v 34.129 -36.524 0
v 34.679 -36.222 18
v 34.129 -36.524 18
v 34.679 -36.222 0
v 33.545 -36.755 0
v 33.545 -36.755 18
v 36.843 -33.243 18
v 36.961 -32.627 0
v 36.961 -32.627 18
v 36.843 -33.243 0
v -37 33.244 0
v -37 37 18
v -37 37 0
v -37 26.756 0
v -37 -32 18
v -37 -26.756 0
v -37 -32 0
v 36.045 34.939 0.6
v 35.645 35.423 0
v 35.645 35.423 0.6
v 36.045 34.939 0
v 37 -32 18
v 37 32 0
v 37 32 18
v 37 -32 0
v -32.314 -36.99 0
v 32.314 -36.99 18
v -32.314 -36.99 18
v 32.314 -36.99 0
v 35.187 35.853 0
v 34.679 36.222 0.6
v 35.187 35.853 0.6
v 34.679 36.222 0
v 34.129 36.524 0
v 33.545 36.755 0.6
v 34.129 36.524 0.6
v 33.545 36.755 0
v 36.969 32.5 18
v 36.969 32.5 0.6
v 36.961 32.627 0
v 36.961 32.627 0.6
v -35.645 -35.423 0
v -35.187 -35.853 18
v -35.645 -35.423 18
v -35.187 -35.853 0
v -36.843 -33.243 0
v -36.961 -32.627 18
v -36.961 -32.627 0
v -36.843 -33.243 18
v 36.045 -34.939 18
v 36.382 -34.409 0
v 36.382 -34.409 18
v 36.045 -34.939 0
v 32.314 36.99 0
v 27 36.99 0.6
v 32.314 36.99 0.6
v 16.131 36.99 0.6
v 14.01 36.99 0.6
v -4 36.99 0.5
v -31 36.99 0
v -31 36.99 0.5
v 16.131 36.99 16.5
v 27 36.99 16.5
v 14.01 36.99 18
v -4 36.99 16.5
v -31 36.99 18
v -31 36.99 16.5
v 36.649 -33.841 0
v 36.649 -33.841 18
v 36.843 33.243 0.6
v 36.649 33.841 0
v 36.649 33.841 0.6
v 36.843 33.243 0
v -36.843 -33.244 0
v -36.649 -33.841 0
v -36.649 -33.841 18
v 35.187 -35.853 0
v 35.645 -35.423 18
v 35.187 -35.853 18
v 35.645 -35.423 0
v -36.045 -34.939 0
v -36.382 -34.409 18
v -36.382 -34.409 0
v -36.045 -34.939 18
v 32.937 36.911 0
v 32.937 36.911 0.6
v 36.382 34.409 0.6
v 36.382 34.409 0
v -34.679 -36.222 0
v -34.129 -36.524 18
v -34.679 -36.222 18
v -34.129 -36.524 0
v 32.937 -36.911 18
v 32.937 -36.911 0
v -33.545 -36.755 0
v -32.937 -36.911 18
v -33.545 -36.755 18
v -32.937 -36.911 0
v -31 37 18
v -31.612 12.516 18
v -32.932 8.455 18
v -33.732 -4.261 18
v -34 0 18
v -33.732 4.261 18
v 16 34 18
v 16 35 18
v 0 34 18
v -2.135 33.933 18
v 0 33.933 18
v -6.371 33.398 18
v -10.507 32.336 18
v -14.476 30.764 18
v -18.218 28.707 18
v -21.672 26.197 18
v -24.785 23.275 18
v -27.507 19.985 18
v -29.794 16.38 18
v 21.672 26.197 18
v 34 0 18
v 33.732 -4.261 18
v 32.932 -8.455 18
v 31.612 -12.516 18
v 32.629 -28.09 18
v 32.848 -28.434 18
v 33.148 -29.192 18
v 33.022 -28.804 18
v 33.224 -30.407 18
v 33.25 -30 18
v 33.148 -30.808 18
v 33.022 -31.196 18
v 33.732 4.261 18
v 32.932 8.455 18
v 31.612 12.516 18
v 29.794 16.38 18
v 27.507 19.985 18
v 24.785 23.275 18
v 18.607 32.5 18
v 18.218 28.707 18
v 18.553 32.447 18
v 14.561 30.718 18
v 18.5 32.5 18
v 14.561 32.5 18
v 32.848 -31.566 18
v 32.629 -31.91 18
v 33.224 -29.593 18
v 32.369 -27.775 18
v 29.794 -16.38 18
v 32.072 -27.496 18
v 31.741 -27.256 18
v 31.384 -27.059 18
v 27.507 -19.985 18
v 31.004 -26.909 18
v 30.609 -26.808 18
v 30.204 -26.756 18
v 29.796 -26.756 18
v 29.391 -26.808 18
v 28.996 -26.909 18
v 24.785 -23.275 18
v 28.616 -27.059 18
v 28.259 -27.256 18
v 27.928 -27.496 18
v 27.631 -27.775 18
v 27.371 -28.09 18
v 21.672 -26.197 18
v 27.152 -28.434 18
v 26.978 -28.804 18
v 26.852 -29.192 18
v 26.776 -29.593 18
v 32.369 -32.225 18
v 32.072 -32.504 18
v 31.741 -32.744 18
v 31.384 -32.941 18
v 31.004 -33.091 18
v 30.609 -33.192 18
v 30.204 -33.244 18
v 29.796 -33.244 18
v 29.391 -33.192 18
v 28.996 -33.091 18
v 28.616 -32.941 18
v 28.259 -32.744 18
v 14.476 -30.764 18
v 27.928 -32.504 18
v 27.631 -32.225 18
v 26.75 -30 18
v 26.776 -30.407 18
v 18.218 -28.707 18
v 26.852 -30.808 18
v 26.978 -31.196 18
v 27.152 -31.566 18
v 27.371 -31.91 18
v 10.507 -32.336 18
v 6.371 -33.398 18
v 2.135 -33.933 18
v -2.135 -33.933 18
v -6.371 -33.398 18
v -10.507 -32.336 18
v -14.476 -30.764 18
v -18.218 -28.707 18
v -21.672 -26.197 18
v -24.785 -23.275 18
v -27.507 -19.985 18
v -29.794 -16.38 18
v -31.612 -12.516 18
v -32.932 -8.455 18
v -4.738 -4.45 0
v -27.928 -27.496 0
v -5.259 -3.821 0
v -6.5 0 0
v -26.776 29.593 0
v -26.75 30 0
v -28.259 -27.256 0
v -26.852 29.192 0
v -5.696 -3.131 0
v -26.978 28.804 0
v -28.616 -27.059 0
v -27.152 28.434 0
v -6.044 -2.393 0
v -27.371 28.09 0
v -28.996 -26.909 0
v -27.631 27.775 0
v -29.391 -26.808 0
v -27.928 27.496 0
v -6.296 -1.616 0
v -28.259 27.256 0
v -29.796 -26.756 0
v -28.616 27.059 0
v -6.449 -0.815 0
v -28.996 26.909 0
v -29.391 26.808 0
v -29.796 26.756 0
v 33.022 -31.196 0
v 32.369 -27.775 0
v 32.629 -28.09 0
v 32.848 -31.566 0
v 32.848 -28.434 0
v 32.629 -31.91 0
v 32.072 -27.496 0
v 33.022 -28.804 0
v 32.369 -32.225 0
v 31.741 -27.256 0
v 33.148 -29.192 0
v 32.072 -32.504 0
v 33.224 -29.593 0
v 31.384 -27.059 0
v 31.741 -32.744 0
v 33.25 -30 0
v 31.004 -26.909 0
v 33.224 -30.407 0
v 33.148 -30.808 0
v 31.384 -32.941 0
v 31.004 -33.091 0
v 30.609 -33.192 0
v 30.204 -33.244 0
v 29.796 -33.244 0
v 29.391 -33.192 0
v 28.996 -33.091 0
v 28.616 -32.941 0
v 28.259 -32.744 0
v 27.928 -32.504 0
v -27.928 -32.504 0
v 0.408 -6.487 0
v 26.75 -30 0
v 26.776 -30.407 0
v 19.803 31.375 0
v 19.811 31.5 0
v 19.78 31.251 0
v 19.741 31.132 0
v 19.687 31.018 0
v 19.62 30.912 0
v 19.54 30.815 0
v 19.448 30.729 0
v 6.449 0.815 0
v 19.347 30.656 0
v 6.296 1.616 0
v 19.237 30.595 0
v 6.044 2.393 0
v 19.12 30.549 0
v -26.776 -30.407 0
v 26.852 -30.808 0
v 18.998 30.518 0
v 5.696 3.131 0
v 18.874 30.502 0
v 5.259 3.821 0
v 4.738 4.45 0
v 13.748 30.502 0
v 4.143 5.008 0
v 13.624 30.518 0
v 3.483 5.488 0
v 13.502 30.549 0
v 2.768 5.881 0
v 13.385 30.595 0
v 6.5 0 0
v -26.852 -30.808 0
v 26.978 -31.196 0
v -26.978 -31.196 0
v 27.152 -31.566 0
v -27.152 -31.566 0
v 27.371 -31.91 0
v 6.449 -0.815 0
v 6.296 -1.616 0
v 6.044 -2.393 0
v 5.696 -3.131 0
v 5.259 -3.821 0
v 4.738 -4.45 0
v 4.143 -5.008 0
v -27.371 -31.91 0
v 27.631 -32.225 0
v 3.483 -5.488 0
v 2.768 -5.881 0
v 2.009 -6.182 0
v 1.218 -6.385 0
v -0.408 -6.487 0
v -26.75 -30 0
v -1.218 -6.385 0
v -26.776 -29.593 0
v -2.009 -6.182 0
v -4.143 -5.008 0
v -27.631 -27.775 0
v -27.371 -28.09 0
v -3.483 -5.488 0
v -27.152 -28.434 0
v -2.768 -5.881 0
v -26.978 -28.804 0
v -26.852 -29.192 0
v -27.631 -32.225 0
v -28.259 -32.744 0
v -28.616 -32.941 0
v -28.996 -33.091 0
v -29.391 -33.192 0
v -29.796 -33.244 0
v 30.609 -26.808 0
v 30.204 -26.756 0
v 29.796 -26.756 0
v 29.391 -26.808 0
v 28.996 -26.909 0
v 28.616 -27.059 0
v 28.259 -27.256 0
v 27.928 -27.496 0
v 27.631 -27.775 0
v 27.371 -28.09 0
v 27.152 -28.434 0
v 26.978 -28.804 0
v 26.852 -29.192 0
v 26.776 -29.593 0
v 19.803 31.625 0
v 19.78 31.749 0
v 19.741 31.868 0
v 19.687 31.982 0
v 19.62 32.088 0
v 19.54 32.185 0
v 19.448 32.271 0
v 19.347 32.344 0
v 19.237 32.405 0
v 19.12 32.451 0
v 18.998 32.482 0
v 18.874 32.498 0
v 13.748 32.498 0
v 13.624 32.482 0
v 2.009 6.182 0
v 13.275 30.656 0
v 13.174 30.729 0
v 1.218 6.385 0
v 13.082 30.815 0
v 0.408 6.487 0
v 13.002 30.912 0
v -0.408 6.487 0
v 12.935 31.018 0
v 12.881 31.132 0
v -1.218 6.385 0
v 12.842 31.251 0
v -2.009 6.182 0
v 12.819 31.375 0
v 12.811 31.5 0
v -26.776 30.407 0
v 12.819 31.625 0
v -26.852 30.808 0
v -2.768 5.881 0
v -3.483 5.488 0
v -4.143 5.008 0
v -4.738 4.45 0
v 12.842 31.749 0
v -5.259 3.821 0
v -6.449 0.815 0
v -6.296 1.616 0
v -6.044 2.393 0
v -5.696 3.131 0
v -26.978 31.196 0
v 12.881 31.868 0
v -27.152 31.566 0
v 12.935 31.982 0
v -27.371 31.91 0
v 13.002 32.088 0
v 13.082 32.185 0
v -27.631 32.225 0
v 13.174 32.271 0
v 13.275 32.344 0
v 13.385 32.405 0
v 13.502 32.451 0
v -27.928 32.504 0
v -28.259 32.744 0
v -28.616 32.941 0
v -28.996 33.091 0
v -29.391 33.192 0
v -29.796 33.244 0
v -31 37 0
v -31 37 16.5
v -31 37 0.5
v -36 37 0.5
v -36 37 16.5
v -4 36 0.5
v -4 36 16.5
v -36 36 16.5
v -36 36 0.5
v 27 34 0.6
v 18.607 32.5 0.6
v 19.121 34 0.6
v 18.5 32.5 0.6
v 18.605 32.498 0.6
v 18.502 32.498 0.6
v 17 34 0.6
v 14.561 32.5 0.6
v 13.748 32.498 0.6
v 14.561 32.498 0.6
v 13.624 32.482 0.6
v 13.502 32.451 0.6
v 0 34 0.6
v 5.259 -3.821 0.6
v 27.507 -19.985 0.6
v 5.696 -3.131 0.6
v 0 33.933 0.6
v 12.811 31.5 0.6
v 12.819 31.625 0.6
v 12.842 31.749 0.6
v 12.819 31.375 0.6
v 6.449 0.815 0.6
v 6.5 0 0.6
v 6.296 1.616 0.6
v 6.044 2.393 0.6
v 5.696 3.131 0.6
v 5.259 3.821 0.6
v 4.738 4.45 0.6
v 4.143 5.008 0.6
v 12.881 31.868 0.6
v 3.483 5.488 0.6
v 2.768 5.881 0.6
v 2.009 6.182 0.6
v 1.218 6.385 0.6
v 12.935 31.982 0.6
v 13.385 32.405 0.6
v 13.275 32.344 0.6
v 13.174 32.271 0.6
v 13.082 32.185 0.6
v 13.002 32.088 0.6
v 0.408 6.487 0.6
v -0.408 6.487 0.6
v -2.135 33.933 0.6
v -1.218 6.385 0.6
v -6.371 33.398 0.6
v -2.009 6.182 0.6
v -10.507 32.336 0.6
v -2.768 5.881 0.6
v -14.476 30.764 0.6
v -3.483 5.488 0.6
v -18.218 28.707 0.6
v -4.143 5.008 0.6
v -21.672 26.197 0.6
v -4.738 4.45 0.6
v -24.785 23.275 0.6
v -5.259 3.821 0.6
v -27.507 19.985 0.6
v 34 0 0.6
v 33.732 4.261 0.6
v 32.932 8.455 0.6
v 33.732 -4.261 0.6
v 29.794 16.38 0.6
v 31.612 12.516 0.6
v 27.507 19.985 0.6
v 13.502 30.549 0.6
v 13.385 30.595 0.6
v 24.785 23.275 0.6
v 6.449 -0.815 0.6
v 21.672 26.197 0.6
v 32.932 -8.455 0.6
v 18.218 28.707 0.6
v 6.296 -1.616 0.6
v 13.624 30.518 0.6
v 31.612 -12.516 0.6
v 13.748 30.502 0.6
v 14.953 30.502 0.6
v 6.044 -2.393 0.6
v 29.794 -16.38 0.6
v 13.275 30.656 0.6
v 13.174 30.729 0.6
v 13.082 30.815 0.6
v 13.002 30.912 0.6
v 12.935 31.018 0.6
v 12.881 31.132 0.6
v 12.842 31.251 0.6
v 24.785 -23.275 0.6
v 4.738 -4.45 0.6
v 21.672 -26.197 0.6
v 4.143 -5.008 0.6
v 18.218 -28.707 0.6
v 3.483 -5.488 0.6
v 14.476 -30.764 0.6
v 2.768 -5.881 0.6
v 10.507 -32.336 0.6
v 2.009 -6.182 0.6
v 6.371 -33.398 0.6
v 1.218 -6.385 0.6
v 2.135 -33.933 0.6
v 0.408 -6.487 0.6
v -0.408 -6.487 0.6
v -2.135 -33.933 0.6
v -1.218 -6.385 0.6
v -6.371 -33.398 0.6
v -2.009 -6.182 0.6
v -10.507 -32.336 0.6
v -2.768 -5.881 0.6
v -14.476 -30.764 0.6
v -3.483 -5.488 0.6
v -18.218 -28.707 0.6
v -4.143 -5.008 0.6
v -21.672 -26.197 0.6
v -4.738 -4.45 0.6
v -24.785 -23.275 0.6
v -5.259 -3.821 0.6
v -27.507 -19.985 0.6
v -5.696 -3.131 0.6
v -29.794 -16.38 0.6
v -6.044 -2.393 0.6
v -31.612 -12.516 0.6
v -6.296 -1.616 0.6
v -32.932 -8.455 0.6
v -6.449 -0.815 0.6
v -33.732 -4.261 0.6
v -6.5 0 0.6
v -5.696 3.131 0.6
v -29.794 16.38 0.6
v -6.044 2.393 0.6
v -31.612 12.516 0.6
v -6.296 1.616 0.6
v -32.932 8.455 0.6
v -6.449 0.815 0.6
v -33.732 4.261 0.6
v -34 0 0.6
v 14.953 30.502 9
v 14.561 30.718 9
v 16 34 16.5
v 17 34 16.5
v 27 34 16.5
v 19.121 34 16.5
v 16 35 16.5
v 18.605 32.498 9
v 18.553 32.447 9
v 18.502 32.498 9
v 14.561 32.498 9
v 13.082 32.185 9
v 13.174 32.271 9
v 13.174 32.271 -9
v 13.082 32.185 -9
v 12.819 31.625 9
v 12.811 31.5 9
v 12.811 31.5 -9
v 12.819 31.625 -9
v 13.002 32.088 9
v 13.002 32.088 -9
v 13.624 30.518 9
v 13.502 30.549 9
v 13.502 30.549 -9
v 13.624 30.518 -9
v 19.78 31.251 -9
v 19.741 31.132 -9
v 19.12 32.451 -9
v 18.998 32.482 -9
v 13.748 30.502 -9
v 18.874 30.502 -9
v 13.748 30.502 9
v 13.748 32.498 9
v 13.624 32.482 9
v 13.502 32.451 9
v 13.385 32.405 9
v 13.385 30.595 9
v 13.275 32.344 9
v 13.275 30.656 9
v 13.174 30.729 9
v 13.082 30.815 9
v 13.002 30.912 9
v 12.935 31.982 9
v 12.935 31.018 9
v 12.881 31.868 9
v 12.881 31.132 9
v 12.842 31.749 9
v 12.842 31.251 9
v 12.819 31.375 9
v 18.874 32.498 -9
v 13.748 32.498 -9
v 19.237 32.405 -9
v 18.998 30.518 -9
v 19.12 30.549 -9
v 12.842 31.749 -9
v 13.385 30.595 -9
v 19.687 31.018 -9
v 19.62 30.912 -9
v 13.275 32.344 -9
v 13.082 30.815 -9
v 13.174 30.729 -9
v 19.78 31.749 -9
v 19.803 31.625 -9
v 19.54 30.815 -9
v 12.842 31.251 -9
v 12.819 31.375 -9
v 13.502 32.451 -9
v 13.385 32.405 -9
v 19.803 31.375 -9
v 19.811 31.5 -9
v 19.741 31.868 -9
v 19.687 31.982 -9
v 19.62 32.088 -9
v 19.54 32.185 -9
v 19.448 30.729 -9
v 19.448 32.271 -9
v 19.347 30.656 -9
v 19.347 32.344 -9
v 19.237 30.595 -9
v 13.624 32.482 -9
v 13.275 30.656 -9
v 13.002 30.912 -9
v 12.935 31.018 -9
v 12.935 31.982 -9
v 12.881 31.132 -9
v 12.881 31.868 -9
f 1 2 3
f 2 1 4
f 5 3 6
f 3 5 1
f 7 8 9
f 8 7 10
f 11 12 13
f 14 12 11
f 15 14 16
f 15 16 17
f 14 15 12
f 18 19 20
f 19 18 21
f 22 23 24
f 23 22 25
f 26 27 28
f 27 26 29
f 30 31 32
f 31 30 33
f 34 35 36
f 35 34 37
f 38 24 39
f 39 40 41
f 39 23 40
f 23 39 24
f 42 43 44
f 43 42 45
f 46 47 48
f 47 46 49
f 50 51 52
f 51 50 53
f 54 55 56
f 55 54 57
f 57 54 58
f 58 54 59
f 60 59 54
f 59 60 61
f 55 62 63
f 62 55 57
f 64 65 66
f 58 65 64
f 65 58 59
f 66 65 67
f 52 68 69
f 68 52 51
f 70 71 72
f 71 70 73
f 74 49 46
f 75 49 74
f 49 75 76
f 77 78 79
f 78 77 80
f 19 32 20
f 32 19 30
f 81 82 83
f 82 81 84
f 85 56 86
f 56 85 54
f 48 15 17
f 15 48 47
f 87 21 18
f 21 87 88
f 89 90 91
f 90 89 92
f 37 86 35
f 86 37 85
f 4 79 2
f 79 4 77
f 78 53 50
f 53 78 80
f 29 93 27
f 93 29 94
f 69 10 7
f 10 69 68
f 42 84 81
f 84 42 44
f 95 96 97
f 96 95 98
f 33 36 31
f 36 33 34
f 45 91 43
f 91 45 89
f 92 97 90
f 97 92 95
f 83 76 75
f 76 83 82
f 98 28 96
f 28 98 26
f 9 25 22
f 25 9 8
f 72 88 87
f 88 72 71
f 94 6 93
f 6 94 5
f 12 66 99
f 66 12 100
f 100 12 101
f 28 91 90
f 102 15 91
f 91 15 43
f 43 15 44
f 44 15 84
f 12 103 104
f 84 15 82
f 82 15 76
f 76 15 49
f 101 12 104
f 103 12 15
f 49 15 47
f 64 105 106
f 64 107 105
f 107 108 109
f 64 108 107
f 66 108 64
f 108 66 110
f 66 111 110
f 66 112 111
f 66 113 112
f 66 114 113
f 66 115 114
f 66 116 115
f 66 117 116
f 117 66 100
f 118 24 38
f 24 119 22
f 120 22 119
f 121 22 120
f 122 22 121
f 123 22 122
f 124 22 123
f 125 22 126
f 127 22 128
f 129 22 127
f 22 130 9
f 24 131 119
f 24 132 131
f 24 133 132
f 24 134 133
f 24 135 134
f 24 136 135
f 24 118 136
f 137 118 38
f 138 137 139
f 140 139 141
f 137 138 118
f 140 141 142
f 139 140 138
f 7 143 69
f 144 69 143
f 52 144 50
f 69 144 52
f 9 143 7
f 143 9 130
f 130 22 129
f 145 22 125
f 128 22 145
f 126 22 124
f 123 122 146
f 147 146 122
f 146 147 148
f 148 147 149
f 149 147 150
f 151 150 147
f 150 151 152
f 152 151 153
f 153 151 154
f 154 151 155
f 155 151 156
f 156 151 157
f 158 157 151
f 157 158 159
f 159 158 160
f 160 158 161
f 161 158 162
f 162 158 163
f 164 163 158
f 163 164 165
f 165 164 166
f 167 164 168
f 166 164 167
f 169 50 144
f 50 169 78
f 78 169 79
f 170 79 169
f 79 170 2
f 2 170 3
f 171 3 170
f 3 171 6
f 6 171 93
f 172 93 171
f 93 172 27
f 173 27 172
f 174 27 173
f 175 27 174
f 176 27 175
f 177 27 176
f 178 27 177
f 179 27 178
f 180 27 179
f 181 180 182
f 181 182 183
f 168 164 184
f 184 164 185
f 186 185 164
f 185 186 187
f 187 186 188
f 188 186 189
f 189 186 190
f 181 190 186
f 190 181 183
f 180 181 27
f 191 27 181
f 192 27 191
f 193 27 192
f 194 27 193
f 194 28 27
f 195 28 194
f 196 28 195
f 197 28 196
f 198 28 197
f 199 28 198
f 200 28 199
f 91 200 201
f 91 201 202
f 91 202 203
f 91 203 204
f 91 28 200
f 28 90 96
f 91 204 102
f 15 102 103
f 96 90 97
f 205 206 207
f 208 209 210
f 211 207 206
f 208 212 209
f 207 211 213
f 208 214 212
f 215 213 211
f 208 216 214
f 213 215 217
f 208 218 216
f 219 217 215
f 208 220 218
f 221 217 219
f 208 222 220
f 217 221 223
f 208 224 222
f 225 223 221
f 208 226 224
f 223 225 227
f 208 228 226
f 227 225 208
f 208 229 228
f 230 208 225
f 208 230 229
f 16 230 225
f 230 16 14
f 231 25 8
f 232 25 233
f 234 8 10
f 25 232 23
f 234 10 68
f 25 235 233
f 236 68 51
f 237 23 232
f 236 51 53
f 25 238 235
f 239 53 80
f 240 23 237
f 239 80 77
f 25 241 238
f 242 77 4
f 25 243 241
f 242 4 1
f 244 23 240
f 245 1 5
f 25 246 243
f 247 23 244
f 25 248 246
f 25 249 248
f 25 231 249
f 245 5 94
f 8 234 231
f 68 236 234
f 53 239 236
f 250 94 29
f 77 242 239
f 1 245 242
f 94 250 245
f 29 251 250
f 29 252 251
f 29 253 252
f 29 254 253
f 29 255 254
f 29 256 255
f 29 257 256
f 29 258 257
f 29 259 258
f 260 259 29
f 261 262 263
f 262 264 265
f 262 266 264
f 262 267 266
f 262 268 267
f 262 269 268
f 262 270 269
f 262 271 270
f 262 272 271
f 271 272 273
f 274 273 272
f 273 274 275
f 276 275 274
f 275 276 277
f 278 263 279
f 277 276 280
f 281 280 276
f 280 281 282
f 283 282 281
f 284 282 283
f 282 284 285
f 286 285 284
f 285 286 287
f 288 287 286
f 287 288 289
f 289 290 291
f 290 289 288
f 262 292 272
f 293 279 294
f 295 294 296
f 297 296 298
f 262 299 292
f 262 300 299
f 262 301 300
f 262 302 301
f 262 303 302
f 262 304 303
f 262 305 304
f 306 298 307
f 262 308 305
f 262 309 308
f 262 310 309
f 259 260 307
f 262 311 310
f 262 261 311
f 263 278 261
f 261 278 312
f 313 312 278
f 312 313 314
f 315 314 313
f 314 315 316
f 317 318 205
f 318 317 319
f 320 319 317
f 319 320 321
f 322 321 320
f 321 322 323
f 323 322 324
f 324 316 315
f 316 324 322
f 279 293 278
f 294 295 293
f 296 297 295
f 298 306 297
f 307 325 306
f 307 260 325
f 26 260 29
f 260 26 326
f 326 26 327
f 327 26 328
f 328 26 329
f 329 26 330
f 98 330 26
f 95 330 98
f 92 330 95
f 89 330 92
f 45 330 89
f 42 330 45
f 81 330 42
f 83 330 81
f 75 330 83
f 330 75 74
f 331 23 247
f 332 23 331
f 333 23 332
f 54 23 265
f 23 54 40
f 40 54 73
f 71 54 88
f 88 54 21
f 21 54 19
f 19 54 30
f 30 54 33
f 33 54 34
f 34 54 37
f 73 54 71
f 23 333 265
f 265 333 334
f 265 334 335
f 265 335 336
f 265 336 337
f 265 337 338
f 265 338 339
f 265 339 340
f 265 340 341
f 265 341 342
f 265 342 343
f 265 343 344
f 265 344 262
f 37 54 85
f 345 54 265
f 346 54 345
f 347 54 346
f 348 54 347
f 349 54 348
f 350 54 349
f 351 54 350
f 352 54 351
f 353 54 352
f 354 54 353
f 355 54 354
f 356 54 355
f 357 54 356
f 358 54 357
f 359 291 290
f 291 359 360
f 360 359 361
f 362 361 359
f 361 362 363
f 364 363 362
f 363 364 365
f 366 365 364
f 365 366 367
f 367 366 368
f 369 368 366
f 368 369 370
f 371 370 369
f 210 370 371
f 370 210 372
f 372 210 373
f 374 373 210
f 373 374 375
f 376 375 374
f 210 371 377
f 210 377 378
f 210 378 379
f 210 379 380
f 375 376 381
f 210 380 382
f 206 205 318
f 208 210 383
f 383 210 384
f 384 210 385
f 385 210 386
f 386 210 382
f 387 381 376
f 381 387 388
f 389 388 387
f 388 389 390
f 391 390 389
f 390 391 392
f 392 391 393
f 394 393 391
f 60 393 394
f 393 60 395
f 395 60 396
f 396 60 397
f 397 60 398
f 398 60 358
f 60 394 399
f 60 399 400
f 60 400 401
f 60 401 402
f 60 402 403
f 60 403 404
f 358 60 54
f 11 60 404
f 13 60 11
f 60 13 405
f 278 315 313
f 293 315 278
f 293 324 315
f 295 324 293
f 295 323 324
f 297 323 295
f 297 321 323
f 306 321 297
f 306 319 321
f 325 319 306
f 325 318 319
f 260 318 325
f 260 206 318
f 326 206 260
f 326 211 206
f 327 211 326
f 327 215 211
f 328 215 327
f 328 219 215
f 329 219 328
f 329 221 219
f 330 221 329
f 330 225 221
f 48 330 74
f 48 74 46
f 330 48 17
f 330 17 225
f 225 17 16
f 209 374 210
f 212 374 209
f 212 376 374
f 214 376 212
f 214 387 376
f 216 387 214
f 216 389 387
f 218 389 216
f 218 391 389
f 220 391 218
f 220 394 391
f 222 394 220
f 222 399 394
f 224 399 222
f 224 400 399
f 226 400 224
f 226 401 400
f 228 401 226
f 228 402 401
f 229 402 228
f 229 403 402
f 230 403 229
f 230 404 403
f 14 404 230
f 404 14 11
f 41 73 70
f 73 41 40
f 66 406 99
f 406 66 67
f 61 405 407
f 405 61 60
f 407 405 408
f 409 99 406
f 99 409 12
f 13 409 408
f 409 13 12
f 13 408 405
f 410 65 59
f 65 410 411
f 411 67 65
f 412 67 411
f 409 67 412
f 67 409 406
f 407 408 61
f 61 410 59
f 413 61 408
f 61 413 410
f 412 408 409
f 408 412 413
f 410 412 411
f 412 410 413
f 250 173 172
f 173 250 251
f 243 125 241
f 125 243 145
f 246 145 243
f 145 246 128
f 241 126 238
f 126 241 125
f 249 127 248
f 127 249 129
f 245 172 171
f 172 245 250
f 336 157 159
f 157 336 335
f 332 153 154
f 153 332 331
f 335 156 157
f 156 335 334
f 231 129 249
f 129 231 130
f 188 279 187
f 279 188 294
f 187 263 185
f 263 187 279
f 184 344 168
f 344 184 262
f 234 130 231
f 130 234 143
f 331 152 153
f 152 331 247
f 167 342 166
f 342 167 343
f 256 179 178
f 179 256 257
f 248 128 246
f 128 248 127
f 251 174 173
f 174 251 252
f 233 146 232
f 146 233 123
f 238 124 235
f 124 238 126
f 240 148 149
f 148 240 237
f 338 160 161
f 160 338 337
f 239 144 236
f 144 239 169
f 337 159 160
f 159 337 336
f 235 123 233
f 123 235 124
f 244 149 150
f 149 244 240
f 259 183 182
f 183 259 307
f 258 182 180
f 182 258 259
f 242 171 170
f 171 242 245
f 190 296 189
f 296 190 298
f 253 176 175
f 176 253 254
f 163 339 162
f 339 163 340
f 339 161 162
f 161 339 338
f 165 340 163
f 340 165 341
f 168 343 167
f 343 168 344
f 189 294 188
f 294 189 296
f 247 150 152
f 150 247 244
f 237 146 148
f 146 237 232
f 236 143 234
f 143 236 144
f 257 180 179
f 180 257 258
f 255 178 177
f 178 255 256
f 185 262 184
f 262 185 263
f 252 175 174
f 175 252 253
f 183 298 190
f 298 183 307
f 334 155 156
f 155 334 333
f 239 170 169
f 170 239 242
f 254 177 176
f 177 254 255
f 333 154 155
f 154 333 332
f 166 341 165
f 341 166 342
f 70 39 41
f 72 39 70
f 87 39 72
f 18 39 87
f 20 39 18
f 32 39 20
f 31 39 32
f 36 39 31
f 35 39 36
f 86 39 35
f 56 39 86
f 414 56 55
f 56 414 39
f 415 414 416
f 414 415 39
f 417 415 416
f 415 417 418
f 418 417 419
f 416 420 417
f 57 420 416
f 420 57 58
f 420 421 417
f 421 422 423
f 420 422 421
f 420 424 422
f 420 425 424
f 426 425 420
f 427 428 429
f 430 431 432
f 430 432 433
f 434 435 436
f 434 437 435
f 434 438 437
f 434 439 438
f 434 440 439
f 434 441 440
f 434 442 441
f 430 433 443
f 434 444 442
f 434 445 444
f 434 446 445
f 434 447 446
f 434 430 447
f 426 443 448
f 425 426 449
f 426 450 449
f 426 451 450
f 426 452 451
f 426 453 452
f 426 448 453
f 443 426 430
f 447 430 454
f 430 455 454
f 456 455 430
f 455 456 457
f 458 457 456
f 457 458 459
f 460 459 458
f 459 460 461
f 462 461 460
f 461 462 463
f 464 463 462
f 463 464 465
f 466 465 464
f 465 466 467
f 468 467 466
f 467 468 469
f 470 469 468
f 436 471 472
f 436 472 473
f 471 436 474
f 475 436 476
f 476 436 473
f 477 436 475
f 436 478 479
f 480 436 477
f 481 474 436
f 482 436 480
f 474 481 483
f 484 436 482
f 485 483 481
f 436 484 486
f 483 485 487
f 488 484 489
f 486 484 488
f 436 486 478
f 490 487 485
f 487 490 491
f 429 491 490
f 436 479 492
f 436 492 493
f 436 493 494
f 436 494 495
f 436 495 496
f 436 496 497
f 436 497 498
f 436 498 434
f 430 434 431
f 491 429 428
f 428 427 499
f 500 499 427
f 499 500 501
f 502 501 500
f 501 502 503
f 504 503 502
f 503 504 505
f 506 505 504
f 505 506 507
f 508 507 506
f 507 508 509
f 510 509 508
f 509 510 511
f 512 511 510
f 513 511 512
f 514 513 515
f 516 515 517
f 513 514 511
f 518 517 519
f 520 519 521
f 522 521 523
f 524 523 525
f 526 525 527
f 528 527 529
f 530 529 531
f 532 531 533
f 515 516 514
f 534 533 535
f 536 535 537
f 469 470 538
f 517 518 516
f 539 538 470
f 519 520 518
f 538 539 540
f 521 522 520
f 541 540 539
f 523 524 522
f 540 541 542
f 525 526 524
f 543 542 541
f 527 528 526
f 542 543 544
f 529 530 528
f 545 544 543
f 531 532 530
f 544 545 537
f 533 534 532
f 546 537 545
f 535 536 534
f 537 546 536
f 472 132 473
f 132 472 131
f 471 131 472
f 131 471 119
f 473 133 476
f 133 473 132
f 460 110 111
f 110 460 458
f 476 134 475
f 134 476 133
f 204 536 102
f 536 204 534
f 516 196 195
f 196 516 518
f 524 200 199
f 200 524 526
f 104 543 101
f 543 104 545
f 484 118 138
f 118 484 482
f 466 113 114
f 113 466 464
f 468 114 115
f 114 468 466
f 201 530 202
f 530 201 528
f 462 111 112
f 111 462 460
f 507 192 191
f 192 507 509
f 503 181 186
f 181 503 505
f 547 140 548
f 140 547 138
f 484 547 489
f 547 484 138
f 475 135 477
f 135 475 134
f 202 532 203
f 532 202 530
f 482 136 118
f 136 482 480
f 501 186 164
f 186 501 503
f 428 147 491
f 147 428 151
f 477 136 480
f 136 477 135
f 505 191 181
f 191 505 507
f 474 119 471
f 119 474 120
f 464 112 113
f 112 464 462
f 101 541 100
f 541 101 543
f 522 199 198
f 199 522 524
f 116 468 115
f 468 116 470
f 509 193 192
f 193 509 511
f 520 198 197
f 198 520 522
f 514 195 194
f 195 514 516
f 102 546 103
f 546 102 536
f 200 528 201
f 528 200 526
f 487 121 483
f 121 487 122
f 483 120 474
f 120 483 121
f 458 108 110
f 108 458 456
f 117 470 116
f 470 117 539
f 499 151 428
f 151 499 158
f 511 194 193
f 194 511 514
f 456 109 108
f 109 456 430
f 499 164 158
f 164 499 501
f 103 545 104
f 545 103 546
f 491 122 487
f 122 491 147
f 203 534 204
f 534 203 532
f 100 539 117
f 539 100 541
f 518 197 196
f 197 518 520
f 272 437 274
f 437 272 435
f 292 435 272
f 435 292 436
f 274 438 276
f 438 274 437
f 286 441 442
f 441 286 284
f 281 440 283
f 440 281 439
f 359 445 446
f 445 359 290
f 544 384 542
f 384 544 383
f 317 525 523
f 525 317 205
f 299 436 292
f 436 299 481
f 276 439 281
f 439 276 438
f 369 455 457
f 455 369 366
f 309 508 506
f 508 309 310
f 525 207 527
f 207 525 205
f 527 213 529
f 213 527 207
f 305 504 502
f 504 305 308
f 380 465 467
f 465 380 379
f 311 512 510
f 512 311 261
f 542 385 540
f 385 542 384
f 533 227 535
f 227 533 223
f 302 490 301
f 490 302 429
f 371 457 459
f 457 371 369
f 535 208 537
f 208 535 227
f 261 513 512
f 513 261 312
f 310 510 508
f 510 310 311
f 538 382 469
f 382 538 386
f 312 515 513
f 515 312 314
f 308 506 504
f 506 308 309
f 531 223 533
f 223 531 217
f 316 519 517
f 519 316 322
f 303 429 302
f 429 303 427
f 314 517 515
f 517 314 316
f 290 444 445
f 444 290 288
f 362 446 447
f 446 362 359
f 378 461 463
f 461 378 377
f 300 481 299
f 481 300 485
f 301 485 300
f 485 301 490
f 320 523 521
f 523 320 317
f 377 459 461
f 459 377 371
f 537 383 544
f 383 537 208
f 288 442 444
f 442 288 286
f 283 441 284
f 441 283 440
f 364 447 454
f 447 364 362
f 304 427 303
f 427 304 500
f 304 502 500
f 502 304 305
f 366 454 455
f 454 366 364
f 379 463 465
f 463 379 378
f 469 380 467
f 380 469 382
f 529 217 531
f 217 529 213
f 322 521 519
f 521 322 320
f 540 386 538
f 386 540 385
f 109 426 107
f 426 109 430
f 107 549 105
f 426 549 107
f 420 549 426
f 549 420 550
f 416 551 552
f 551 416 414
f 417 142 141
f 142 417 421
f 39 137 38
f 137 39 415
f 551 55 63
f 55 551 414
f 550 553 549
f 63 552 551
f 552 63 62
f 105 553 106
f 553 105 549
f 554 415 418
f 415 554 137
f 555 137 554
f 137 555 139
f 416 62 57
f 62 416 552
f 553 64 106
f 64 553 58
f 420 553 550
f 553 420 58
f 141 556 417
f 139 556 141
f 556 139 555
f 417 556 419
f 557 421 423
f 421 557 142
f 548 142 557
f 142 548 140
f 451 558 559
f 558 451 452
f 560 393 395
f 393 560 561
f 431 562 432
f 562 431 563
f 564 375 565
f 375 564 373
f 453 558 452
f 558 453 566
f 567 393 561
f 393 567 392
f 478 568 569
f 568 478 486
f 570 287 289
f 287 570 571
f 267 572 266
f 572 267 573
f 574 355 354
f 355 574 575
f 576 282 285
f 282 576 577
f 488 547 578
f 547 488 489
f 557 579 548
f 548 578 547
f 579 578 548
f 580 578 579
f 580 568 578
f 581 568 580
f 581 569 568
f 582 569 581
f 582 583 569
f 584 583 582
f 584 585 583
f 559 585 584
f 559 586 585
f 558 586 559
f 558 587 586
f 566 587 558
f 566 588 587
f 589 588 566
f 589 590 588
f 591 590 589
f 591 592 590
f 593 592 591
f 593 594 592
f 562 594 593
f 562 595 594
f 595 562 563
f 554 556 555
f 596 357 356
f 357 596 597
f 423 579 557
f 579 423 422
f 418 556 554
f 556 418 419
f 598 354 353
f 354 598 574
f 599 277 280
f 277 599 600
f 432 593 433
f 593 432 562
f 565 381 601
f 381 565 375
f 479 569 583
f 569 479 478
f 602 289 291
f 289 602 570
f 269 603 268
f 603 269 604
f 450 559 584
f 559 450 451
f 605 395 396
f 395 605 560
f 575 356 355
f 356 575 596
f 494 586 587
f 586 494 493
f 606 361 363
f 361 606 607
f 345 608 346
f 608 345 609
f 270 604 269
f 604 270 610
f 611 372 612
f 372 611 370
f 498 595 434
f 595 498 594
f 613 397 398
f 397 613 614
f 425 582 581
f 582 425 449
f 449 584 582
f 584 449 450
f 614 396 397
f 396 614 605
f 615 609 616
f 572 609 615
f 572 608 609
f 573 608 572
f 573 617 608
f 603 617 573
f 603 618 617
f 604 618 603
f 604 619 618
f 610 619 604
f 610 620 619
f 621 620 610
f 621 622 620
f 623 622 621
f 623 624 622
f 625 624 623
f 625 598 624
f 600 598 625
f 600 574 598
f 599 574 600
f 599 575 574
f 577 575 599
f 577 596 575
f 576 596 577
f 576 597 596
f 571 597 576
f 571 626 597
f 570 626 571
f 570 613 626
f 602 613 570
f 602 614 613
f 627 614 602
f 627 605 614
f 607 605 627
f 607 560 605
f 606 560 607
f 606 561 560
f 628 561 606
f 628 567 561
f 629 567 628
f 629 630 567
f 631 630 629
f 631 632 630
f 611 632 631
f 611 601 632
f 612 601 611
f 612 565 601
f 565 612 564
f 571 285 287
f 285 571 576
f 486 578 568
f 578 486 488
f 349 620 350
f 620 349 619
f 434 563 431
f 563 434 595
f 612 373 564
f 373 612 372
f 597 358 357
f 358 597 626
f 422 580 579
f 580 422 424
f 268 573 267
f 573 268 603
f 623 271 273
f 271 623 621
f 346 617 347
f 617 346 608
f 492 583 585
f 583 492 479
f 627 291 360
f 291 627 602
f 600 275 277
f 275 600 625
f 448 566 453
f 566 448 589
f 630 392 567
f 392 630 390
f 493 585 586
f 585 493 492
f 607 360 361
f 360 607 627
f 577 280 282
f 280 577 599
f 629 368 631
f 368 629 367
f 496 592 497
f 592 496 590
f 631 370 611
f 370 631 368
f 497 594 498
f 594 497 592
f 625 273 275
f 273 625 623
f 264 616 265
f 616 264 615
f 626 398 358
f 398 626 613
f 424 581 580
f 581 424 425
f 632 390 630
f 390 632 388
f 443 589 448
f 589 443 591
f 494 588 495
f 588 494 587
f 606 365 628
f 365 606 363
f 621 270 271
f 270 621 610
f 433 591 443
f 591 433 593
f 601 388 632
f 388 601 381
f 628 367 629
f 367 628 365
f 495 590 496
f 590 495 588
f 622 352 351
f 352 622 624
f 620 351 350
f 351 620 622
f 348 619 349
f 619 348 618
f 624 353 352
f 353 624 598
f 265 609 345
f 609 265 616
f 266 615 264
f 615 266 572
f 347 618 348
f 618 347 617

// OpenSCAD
$fn = 50;


union() {
	difference() {
		union() {
			hull() {
				translate(v = [-32.0000000000, 32.0000000000, 0]) {
					cylinder(h = 18, r = 5);
				}
				translate(v = [32.0000000000, 32.0000000000, 0]) {
					cylinder(h = 18, r = 5);
				}
				translate(v = [-32.0000000000, -32.0000000000, 0]) {
					cylinder(h = 18, r = 5);
				}
				translate(v = [32.0000000000, -32.0000000000, 0]) {
					cylinder(h = 18, r = 5);
				}
			}
			translate(v = [-37.0000000000, 31.0000000000, 0]) {
				cube(size = [6, 6, 18]);
			}
		}
		union() {
			translate(v = [-37.5000000000, -30.0000000000, -250.0000000000]) {
				rotate(a = [0, 0, 0]) {
					difference() {
						union() {
							hull() {
								translate(v = [7.5000000000, 0, 0]) {
									cylinder(h = 250, r = 3.2500000000, r1 = 3.2500000000, r2 = 3.2500000000);
								}
								translate(v = [-7.5000000000, 0, 0]) {
									cylinder(h = 250, r = 3.2500000000, r1 = 3.2500000000, r2 = 3.2500000000);
								}
							}
						}
						union();
					}
				}
			}
			translate(v = [-37.5000000000, 30.0000000000, -250.0000000000]) {
				rotate(a = [0, 0, 0]) {
					difference() {
						union() {
							hull() {
								translate(v = [7.5000000000, 0, 0]) {
									cylinder(h = 250, r = 3.2500000000, r1 = 3.2500000000, r2 = 3.2500000000);
								}
								translate(v = [-7.5000000000, 0, 0]) {
									cylinder(h = 250, r = 3.2500000000, r1 = 3.2500000000, r2 = 3.2500000000);
								}
							}
						}
						union();
					}
				}
			}
			translate(v = [-36.0000000000, 36.0000000000, 0.5000000000]) {
				cube(size = [32, 1, 16]);
			}
			translate(v = [30.0000000000, -30.0000000000, 0]) {
				cylinder(h = 100, r = 3.2500000000);
			}
			translate(v = [0, 0, 0.6000000000]) {
				cylinder(h = 20.4000000000, r = 34.0000000000);
			}
			translate(v = [0, 0, -9.0000000000]) {
				cylinder(h = 18, r = 6.5000000000);
			}
			translate(v = [0.0000000000, 32.5000000000, 0.6000000000]) {
				cube(size = [37.0000000000, 1.5000000000, 20.4000000000]);
			}
			translate(v = [27.0000000000, 32.5000000000, 0.6000000000]) {
				cube(size = [10, 4.5000000000, 20.4000000000]);
			}
			translate(v = [16.0000000000, 32.5000000000, 16.5000000000]) {
				cube(size = [21, 4.5000000000, 1.5000000000]);
			}
			translate(v = [13.2500000000, 37.7500000000, 0.6000000000]) {
				rotate(a = [0, 0, -45]) {
					cube(size = [7.5000000000, 1.5000000000, 20.4000000000]);
				}
			}
			translate(v = [7.0610000000, 30.5000000000, 0.6000000000]) {
				cube(size = [7.5000000000, 2, 17.4000000000]);
			}
		}
	}
	union() {
		translate(v = [16.3110000000, 31.5000000000, -9.0000000000]) {
			rotate(a = [0, 0, 0]) {
				difference() {
					union() {
						#hull() {
							#translate(v = [2.5000000000, 0, 0]) {
								cylinder(h = 18, r = 1.0000000000, r1 = 1.0000000000, r2 = 1.0000000000);
							}
							#translate(v = [-2.5000000000, 0, 0]) {
								cylinder(h = 18, r = 1.0000000000, r1 = 1.0000000000, r2 = 1.0000000000);
							}
						}
					}
					union();
				}
			}
		}
	}
}
